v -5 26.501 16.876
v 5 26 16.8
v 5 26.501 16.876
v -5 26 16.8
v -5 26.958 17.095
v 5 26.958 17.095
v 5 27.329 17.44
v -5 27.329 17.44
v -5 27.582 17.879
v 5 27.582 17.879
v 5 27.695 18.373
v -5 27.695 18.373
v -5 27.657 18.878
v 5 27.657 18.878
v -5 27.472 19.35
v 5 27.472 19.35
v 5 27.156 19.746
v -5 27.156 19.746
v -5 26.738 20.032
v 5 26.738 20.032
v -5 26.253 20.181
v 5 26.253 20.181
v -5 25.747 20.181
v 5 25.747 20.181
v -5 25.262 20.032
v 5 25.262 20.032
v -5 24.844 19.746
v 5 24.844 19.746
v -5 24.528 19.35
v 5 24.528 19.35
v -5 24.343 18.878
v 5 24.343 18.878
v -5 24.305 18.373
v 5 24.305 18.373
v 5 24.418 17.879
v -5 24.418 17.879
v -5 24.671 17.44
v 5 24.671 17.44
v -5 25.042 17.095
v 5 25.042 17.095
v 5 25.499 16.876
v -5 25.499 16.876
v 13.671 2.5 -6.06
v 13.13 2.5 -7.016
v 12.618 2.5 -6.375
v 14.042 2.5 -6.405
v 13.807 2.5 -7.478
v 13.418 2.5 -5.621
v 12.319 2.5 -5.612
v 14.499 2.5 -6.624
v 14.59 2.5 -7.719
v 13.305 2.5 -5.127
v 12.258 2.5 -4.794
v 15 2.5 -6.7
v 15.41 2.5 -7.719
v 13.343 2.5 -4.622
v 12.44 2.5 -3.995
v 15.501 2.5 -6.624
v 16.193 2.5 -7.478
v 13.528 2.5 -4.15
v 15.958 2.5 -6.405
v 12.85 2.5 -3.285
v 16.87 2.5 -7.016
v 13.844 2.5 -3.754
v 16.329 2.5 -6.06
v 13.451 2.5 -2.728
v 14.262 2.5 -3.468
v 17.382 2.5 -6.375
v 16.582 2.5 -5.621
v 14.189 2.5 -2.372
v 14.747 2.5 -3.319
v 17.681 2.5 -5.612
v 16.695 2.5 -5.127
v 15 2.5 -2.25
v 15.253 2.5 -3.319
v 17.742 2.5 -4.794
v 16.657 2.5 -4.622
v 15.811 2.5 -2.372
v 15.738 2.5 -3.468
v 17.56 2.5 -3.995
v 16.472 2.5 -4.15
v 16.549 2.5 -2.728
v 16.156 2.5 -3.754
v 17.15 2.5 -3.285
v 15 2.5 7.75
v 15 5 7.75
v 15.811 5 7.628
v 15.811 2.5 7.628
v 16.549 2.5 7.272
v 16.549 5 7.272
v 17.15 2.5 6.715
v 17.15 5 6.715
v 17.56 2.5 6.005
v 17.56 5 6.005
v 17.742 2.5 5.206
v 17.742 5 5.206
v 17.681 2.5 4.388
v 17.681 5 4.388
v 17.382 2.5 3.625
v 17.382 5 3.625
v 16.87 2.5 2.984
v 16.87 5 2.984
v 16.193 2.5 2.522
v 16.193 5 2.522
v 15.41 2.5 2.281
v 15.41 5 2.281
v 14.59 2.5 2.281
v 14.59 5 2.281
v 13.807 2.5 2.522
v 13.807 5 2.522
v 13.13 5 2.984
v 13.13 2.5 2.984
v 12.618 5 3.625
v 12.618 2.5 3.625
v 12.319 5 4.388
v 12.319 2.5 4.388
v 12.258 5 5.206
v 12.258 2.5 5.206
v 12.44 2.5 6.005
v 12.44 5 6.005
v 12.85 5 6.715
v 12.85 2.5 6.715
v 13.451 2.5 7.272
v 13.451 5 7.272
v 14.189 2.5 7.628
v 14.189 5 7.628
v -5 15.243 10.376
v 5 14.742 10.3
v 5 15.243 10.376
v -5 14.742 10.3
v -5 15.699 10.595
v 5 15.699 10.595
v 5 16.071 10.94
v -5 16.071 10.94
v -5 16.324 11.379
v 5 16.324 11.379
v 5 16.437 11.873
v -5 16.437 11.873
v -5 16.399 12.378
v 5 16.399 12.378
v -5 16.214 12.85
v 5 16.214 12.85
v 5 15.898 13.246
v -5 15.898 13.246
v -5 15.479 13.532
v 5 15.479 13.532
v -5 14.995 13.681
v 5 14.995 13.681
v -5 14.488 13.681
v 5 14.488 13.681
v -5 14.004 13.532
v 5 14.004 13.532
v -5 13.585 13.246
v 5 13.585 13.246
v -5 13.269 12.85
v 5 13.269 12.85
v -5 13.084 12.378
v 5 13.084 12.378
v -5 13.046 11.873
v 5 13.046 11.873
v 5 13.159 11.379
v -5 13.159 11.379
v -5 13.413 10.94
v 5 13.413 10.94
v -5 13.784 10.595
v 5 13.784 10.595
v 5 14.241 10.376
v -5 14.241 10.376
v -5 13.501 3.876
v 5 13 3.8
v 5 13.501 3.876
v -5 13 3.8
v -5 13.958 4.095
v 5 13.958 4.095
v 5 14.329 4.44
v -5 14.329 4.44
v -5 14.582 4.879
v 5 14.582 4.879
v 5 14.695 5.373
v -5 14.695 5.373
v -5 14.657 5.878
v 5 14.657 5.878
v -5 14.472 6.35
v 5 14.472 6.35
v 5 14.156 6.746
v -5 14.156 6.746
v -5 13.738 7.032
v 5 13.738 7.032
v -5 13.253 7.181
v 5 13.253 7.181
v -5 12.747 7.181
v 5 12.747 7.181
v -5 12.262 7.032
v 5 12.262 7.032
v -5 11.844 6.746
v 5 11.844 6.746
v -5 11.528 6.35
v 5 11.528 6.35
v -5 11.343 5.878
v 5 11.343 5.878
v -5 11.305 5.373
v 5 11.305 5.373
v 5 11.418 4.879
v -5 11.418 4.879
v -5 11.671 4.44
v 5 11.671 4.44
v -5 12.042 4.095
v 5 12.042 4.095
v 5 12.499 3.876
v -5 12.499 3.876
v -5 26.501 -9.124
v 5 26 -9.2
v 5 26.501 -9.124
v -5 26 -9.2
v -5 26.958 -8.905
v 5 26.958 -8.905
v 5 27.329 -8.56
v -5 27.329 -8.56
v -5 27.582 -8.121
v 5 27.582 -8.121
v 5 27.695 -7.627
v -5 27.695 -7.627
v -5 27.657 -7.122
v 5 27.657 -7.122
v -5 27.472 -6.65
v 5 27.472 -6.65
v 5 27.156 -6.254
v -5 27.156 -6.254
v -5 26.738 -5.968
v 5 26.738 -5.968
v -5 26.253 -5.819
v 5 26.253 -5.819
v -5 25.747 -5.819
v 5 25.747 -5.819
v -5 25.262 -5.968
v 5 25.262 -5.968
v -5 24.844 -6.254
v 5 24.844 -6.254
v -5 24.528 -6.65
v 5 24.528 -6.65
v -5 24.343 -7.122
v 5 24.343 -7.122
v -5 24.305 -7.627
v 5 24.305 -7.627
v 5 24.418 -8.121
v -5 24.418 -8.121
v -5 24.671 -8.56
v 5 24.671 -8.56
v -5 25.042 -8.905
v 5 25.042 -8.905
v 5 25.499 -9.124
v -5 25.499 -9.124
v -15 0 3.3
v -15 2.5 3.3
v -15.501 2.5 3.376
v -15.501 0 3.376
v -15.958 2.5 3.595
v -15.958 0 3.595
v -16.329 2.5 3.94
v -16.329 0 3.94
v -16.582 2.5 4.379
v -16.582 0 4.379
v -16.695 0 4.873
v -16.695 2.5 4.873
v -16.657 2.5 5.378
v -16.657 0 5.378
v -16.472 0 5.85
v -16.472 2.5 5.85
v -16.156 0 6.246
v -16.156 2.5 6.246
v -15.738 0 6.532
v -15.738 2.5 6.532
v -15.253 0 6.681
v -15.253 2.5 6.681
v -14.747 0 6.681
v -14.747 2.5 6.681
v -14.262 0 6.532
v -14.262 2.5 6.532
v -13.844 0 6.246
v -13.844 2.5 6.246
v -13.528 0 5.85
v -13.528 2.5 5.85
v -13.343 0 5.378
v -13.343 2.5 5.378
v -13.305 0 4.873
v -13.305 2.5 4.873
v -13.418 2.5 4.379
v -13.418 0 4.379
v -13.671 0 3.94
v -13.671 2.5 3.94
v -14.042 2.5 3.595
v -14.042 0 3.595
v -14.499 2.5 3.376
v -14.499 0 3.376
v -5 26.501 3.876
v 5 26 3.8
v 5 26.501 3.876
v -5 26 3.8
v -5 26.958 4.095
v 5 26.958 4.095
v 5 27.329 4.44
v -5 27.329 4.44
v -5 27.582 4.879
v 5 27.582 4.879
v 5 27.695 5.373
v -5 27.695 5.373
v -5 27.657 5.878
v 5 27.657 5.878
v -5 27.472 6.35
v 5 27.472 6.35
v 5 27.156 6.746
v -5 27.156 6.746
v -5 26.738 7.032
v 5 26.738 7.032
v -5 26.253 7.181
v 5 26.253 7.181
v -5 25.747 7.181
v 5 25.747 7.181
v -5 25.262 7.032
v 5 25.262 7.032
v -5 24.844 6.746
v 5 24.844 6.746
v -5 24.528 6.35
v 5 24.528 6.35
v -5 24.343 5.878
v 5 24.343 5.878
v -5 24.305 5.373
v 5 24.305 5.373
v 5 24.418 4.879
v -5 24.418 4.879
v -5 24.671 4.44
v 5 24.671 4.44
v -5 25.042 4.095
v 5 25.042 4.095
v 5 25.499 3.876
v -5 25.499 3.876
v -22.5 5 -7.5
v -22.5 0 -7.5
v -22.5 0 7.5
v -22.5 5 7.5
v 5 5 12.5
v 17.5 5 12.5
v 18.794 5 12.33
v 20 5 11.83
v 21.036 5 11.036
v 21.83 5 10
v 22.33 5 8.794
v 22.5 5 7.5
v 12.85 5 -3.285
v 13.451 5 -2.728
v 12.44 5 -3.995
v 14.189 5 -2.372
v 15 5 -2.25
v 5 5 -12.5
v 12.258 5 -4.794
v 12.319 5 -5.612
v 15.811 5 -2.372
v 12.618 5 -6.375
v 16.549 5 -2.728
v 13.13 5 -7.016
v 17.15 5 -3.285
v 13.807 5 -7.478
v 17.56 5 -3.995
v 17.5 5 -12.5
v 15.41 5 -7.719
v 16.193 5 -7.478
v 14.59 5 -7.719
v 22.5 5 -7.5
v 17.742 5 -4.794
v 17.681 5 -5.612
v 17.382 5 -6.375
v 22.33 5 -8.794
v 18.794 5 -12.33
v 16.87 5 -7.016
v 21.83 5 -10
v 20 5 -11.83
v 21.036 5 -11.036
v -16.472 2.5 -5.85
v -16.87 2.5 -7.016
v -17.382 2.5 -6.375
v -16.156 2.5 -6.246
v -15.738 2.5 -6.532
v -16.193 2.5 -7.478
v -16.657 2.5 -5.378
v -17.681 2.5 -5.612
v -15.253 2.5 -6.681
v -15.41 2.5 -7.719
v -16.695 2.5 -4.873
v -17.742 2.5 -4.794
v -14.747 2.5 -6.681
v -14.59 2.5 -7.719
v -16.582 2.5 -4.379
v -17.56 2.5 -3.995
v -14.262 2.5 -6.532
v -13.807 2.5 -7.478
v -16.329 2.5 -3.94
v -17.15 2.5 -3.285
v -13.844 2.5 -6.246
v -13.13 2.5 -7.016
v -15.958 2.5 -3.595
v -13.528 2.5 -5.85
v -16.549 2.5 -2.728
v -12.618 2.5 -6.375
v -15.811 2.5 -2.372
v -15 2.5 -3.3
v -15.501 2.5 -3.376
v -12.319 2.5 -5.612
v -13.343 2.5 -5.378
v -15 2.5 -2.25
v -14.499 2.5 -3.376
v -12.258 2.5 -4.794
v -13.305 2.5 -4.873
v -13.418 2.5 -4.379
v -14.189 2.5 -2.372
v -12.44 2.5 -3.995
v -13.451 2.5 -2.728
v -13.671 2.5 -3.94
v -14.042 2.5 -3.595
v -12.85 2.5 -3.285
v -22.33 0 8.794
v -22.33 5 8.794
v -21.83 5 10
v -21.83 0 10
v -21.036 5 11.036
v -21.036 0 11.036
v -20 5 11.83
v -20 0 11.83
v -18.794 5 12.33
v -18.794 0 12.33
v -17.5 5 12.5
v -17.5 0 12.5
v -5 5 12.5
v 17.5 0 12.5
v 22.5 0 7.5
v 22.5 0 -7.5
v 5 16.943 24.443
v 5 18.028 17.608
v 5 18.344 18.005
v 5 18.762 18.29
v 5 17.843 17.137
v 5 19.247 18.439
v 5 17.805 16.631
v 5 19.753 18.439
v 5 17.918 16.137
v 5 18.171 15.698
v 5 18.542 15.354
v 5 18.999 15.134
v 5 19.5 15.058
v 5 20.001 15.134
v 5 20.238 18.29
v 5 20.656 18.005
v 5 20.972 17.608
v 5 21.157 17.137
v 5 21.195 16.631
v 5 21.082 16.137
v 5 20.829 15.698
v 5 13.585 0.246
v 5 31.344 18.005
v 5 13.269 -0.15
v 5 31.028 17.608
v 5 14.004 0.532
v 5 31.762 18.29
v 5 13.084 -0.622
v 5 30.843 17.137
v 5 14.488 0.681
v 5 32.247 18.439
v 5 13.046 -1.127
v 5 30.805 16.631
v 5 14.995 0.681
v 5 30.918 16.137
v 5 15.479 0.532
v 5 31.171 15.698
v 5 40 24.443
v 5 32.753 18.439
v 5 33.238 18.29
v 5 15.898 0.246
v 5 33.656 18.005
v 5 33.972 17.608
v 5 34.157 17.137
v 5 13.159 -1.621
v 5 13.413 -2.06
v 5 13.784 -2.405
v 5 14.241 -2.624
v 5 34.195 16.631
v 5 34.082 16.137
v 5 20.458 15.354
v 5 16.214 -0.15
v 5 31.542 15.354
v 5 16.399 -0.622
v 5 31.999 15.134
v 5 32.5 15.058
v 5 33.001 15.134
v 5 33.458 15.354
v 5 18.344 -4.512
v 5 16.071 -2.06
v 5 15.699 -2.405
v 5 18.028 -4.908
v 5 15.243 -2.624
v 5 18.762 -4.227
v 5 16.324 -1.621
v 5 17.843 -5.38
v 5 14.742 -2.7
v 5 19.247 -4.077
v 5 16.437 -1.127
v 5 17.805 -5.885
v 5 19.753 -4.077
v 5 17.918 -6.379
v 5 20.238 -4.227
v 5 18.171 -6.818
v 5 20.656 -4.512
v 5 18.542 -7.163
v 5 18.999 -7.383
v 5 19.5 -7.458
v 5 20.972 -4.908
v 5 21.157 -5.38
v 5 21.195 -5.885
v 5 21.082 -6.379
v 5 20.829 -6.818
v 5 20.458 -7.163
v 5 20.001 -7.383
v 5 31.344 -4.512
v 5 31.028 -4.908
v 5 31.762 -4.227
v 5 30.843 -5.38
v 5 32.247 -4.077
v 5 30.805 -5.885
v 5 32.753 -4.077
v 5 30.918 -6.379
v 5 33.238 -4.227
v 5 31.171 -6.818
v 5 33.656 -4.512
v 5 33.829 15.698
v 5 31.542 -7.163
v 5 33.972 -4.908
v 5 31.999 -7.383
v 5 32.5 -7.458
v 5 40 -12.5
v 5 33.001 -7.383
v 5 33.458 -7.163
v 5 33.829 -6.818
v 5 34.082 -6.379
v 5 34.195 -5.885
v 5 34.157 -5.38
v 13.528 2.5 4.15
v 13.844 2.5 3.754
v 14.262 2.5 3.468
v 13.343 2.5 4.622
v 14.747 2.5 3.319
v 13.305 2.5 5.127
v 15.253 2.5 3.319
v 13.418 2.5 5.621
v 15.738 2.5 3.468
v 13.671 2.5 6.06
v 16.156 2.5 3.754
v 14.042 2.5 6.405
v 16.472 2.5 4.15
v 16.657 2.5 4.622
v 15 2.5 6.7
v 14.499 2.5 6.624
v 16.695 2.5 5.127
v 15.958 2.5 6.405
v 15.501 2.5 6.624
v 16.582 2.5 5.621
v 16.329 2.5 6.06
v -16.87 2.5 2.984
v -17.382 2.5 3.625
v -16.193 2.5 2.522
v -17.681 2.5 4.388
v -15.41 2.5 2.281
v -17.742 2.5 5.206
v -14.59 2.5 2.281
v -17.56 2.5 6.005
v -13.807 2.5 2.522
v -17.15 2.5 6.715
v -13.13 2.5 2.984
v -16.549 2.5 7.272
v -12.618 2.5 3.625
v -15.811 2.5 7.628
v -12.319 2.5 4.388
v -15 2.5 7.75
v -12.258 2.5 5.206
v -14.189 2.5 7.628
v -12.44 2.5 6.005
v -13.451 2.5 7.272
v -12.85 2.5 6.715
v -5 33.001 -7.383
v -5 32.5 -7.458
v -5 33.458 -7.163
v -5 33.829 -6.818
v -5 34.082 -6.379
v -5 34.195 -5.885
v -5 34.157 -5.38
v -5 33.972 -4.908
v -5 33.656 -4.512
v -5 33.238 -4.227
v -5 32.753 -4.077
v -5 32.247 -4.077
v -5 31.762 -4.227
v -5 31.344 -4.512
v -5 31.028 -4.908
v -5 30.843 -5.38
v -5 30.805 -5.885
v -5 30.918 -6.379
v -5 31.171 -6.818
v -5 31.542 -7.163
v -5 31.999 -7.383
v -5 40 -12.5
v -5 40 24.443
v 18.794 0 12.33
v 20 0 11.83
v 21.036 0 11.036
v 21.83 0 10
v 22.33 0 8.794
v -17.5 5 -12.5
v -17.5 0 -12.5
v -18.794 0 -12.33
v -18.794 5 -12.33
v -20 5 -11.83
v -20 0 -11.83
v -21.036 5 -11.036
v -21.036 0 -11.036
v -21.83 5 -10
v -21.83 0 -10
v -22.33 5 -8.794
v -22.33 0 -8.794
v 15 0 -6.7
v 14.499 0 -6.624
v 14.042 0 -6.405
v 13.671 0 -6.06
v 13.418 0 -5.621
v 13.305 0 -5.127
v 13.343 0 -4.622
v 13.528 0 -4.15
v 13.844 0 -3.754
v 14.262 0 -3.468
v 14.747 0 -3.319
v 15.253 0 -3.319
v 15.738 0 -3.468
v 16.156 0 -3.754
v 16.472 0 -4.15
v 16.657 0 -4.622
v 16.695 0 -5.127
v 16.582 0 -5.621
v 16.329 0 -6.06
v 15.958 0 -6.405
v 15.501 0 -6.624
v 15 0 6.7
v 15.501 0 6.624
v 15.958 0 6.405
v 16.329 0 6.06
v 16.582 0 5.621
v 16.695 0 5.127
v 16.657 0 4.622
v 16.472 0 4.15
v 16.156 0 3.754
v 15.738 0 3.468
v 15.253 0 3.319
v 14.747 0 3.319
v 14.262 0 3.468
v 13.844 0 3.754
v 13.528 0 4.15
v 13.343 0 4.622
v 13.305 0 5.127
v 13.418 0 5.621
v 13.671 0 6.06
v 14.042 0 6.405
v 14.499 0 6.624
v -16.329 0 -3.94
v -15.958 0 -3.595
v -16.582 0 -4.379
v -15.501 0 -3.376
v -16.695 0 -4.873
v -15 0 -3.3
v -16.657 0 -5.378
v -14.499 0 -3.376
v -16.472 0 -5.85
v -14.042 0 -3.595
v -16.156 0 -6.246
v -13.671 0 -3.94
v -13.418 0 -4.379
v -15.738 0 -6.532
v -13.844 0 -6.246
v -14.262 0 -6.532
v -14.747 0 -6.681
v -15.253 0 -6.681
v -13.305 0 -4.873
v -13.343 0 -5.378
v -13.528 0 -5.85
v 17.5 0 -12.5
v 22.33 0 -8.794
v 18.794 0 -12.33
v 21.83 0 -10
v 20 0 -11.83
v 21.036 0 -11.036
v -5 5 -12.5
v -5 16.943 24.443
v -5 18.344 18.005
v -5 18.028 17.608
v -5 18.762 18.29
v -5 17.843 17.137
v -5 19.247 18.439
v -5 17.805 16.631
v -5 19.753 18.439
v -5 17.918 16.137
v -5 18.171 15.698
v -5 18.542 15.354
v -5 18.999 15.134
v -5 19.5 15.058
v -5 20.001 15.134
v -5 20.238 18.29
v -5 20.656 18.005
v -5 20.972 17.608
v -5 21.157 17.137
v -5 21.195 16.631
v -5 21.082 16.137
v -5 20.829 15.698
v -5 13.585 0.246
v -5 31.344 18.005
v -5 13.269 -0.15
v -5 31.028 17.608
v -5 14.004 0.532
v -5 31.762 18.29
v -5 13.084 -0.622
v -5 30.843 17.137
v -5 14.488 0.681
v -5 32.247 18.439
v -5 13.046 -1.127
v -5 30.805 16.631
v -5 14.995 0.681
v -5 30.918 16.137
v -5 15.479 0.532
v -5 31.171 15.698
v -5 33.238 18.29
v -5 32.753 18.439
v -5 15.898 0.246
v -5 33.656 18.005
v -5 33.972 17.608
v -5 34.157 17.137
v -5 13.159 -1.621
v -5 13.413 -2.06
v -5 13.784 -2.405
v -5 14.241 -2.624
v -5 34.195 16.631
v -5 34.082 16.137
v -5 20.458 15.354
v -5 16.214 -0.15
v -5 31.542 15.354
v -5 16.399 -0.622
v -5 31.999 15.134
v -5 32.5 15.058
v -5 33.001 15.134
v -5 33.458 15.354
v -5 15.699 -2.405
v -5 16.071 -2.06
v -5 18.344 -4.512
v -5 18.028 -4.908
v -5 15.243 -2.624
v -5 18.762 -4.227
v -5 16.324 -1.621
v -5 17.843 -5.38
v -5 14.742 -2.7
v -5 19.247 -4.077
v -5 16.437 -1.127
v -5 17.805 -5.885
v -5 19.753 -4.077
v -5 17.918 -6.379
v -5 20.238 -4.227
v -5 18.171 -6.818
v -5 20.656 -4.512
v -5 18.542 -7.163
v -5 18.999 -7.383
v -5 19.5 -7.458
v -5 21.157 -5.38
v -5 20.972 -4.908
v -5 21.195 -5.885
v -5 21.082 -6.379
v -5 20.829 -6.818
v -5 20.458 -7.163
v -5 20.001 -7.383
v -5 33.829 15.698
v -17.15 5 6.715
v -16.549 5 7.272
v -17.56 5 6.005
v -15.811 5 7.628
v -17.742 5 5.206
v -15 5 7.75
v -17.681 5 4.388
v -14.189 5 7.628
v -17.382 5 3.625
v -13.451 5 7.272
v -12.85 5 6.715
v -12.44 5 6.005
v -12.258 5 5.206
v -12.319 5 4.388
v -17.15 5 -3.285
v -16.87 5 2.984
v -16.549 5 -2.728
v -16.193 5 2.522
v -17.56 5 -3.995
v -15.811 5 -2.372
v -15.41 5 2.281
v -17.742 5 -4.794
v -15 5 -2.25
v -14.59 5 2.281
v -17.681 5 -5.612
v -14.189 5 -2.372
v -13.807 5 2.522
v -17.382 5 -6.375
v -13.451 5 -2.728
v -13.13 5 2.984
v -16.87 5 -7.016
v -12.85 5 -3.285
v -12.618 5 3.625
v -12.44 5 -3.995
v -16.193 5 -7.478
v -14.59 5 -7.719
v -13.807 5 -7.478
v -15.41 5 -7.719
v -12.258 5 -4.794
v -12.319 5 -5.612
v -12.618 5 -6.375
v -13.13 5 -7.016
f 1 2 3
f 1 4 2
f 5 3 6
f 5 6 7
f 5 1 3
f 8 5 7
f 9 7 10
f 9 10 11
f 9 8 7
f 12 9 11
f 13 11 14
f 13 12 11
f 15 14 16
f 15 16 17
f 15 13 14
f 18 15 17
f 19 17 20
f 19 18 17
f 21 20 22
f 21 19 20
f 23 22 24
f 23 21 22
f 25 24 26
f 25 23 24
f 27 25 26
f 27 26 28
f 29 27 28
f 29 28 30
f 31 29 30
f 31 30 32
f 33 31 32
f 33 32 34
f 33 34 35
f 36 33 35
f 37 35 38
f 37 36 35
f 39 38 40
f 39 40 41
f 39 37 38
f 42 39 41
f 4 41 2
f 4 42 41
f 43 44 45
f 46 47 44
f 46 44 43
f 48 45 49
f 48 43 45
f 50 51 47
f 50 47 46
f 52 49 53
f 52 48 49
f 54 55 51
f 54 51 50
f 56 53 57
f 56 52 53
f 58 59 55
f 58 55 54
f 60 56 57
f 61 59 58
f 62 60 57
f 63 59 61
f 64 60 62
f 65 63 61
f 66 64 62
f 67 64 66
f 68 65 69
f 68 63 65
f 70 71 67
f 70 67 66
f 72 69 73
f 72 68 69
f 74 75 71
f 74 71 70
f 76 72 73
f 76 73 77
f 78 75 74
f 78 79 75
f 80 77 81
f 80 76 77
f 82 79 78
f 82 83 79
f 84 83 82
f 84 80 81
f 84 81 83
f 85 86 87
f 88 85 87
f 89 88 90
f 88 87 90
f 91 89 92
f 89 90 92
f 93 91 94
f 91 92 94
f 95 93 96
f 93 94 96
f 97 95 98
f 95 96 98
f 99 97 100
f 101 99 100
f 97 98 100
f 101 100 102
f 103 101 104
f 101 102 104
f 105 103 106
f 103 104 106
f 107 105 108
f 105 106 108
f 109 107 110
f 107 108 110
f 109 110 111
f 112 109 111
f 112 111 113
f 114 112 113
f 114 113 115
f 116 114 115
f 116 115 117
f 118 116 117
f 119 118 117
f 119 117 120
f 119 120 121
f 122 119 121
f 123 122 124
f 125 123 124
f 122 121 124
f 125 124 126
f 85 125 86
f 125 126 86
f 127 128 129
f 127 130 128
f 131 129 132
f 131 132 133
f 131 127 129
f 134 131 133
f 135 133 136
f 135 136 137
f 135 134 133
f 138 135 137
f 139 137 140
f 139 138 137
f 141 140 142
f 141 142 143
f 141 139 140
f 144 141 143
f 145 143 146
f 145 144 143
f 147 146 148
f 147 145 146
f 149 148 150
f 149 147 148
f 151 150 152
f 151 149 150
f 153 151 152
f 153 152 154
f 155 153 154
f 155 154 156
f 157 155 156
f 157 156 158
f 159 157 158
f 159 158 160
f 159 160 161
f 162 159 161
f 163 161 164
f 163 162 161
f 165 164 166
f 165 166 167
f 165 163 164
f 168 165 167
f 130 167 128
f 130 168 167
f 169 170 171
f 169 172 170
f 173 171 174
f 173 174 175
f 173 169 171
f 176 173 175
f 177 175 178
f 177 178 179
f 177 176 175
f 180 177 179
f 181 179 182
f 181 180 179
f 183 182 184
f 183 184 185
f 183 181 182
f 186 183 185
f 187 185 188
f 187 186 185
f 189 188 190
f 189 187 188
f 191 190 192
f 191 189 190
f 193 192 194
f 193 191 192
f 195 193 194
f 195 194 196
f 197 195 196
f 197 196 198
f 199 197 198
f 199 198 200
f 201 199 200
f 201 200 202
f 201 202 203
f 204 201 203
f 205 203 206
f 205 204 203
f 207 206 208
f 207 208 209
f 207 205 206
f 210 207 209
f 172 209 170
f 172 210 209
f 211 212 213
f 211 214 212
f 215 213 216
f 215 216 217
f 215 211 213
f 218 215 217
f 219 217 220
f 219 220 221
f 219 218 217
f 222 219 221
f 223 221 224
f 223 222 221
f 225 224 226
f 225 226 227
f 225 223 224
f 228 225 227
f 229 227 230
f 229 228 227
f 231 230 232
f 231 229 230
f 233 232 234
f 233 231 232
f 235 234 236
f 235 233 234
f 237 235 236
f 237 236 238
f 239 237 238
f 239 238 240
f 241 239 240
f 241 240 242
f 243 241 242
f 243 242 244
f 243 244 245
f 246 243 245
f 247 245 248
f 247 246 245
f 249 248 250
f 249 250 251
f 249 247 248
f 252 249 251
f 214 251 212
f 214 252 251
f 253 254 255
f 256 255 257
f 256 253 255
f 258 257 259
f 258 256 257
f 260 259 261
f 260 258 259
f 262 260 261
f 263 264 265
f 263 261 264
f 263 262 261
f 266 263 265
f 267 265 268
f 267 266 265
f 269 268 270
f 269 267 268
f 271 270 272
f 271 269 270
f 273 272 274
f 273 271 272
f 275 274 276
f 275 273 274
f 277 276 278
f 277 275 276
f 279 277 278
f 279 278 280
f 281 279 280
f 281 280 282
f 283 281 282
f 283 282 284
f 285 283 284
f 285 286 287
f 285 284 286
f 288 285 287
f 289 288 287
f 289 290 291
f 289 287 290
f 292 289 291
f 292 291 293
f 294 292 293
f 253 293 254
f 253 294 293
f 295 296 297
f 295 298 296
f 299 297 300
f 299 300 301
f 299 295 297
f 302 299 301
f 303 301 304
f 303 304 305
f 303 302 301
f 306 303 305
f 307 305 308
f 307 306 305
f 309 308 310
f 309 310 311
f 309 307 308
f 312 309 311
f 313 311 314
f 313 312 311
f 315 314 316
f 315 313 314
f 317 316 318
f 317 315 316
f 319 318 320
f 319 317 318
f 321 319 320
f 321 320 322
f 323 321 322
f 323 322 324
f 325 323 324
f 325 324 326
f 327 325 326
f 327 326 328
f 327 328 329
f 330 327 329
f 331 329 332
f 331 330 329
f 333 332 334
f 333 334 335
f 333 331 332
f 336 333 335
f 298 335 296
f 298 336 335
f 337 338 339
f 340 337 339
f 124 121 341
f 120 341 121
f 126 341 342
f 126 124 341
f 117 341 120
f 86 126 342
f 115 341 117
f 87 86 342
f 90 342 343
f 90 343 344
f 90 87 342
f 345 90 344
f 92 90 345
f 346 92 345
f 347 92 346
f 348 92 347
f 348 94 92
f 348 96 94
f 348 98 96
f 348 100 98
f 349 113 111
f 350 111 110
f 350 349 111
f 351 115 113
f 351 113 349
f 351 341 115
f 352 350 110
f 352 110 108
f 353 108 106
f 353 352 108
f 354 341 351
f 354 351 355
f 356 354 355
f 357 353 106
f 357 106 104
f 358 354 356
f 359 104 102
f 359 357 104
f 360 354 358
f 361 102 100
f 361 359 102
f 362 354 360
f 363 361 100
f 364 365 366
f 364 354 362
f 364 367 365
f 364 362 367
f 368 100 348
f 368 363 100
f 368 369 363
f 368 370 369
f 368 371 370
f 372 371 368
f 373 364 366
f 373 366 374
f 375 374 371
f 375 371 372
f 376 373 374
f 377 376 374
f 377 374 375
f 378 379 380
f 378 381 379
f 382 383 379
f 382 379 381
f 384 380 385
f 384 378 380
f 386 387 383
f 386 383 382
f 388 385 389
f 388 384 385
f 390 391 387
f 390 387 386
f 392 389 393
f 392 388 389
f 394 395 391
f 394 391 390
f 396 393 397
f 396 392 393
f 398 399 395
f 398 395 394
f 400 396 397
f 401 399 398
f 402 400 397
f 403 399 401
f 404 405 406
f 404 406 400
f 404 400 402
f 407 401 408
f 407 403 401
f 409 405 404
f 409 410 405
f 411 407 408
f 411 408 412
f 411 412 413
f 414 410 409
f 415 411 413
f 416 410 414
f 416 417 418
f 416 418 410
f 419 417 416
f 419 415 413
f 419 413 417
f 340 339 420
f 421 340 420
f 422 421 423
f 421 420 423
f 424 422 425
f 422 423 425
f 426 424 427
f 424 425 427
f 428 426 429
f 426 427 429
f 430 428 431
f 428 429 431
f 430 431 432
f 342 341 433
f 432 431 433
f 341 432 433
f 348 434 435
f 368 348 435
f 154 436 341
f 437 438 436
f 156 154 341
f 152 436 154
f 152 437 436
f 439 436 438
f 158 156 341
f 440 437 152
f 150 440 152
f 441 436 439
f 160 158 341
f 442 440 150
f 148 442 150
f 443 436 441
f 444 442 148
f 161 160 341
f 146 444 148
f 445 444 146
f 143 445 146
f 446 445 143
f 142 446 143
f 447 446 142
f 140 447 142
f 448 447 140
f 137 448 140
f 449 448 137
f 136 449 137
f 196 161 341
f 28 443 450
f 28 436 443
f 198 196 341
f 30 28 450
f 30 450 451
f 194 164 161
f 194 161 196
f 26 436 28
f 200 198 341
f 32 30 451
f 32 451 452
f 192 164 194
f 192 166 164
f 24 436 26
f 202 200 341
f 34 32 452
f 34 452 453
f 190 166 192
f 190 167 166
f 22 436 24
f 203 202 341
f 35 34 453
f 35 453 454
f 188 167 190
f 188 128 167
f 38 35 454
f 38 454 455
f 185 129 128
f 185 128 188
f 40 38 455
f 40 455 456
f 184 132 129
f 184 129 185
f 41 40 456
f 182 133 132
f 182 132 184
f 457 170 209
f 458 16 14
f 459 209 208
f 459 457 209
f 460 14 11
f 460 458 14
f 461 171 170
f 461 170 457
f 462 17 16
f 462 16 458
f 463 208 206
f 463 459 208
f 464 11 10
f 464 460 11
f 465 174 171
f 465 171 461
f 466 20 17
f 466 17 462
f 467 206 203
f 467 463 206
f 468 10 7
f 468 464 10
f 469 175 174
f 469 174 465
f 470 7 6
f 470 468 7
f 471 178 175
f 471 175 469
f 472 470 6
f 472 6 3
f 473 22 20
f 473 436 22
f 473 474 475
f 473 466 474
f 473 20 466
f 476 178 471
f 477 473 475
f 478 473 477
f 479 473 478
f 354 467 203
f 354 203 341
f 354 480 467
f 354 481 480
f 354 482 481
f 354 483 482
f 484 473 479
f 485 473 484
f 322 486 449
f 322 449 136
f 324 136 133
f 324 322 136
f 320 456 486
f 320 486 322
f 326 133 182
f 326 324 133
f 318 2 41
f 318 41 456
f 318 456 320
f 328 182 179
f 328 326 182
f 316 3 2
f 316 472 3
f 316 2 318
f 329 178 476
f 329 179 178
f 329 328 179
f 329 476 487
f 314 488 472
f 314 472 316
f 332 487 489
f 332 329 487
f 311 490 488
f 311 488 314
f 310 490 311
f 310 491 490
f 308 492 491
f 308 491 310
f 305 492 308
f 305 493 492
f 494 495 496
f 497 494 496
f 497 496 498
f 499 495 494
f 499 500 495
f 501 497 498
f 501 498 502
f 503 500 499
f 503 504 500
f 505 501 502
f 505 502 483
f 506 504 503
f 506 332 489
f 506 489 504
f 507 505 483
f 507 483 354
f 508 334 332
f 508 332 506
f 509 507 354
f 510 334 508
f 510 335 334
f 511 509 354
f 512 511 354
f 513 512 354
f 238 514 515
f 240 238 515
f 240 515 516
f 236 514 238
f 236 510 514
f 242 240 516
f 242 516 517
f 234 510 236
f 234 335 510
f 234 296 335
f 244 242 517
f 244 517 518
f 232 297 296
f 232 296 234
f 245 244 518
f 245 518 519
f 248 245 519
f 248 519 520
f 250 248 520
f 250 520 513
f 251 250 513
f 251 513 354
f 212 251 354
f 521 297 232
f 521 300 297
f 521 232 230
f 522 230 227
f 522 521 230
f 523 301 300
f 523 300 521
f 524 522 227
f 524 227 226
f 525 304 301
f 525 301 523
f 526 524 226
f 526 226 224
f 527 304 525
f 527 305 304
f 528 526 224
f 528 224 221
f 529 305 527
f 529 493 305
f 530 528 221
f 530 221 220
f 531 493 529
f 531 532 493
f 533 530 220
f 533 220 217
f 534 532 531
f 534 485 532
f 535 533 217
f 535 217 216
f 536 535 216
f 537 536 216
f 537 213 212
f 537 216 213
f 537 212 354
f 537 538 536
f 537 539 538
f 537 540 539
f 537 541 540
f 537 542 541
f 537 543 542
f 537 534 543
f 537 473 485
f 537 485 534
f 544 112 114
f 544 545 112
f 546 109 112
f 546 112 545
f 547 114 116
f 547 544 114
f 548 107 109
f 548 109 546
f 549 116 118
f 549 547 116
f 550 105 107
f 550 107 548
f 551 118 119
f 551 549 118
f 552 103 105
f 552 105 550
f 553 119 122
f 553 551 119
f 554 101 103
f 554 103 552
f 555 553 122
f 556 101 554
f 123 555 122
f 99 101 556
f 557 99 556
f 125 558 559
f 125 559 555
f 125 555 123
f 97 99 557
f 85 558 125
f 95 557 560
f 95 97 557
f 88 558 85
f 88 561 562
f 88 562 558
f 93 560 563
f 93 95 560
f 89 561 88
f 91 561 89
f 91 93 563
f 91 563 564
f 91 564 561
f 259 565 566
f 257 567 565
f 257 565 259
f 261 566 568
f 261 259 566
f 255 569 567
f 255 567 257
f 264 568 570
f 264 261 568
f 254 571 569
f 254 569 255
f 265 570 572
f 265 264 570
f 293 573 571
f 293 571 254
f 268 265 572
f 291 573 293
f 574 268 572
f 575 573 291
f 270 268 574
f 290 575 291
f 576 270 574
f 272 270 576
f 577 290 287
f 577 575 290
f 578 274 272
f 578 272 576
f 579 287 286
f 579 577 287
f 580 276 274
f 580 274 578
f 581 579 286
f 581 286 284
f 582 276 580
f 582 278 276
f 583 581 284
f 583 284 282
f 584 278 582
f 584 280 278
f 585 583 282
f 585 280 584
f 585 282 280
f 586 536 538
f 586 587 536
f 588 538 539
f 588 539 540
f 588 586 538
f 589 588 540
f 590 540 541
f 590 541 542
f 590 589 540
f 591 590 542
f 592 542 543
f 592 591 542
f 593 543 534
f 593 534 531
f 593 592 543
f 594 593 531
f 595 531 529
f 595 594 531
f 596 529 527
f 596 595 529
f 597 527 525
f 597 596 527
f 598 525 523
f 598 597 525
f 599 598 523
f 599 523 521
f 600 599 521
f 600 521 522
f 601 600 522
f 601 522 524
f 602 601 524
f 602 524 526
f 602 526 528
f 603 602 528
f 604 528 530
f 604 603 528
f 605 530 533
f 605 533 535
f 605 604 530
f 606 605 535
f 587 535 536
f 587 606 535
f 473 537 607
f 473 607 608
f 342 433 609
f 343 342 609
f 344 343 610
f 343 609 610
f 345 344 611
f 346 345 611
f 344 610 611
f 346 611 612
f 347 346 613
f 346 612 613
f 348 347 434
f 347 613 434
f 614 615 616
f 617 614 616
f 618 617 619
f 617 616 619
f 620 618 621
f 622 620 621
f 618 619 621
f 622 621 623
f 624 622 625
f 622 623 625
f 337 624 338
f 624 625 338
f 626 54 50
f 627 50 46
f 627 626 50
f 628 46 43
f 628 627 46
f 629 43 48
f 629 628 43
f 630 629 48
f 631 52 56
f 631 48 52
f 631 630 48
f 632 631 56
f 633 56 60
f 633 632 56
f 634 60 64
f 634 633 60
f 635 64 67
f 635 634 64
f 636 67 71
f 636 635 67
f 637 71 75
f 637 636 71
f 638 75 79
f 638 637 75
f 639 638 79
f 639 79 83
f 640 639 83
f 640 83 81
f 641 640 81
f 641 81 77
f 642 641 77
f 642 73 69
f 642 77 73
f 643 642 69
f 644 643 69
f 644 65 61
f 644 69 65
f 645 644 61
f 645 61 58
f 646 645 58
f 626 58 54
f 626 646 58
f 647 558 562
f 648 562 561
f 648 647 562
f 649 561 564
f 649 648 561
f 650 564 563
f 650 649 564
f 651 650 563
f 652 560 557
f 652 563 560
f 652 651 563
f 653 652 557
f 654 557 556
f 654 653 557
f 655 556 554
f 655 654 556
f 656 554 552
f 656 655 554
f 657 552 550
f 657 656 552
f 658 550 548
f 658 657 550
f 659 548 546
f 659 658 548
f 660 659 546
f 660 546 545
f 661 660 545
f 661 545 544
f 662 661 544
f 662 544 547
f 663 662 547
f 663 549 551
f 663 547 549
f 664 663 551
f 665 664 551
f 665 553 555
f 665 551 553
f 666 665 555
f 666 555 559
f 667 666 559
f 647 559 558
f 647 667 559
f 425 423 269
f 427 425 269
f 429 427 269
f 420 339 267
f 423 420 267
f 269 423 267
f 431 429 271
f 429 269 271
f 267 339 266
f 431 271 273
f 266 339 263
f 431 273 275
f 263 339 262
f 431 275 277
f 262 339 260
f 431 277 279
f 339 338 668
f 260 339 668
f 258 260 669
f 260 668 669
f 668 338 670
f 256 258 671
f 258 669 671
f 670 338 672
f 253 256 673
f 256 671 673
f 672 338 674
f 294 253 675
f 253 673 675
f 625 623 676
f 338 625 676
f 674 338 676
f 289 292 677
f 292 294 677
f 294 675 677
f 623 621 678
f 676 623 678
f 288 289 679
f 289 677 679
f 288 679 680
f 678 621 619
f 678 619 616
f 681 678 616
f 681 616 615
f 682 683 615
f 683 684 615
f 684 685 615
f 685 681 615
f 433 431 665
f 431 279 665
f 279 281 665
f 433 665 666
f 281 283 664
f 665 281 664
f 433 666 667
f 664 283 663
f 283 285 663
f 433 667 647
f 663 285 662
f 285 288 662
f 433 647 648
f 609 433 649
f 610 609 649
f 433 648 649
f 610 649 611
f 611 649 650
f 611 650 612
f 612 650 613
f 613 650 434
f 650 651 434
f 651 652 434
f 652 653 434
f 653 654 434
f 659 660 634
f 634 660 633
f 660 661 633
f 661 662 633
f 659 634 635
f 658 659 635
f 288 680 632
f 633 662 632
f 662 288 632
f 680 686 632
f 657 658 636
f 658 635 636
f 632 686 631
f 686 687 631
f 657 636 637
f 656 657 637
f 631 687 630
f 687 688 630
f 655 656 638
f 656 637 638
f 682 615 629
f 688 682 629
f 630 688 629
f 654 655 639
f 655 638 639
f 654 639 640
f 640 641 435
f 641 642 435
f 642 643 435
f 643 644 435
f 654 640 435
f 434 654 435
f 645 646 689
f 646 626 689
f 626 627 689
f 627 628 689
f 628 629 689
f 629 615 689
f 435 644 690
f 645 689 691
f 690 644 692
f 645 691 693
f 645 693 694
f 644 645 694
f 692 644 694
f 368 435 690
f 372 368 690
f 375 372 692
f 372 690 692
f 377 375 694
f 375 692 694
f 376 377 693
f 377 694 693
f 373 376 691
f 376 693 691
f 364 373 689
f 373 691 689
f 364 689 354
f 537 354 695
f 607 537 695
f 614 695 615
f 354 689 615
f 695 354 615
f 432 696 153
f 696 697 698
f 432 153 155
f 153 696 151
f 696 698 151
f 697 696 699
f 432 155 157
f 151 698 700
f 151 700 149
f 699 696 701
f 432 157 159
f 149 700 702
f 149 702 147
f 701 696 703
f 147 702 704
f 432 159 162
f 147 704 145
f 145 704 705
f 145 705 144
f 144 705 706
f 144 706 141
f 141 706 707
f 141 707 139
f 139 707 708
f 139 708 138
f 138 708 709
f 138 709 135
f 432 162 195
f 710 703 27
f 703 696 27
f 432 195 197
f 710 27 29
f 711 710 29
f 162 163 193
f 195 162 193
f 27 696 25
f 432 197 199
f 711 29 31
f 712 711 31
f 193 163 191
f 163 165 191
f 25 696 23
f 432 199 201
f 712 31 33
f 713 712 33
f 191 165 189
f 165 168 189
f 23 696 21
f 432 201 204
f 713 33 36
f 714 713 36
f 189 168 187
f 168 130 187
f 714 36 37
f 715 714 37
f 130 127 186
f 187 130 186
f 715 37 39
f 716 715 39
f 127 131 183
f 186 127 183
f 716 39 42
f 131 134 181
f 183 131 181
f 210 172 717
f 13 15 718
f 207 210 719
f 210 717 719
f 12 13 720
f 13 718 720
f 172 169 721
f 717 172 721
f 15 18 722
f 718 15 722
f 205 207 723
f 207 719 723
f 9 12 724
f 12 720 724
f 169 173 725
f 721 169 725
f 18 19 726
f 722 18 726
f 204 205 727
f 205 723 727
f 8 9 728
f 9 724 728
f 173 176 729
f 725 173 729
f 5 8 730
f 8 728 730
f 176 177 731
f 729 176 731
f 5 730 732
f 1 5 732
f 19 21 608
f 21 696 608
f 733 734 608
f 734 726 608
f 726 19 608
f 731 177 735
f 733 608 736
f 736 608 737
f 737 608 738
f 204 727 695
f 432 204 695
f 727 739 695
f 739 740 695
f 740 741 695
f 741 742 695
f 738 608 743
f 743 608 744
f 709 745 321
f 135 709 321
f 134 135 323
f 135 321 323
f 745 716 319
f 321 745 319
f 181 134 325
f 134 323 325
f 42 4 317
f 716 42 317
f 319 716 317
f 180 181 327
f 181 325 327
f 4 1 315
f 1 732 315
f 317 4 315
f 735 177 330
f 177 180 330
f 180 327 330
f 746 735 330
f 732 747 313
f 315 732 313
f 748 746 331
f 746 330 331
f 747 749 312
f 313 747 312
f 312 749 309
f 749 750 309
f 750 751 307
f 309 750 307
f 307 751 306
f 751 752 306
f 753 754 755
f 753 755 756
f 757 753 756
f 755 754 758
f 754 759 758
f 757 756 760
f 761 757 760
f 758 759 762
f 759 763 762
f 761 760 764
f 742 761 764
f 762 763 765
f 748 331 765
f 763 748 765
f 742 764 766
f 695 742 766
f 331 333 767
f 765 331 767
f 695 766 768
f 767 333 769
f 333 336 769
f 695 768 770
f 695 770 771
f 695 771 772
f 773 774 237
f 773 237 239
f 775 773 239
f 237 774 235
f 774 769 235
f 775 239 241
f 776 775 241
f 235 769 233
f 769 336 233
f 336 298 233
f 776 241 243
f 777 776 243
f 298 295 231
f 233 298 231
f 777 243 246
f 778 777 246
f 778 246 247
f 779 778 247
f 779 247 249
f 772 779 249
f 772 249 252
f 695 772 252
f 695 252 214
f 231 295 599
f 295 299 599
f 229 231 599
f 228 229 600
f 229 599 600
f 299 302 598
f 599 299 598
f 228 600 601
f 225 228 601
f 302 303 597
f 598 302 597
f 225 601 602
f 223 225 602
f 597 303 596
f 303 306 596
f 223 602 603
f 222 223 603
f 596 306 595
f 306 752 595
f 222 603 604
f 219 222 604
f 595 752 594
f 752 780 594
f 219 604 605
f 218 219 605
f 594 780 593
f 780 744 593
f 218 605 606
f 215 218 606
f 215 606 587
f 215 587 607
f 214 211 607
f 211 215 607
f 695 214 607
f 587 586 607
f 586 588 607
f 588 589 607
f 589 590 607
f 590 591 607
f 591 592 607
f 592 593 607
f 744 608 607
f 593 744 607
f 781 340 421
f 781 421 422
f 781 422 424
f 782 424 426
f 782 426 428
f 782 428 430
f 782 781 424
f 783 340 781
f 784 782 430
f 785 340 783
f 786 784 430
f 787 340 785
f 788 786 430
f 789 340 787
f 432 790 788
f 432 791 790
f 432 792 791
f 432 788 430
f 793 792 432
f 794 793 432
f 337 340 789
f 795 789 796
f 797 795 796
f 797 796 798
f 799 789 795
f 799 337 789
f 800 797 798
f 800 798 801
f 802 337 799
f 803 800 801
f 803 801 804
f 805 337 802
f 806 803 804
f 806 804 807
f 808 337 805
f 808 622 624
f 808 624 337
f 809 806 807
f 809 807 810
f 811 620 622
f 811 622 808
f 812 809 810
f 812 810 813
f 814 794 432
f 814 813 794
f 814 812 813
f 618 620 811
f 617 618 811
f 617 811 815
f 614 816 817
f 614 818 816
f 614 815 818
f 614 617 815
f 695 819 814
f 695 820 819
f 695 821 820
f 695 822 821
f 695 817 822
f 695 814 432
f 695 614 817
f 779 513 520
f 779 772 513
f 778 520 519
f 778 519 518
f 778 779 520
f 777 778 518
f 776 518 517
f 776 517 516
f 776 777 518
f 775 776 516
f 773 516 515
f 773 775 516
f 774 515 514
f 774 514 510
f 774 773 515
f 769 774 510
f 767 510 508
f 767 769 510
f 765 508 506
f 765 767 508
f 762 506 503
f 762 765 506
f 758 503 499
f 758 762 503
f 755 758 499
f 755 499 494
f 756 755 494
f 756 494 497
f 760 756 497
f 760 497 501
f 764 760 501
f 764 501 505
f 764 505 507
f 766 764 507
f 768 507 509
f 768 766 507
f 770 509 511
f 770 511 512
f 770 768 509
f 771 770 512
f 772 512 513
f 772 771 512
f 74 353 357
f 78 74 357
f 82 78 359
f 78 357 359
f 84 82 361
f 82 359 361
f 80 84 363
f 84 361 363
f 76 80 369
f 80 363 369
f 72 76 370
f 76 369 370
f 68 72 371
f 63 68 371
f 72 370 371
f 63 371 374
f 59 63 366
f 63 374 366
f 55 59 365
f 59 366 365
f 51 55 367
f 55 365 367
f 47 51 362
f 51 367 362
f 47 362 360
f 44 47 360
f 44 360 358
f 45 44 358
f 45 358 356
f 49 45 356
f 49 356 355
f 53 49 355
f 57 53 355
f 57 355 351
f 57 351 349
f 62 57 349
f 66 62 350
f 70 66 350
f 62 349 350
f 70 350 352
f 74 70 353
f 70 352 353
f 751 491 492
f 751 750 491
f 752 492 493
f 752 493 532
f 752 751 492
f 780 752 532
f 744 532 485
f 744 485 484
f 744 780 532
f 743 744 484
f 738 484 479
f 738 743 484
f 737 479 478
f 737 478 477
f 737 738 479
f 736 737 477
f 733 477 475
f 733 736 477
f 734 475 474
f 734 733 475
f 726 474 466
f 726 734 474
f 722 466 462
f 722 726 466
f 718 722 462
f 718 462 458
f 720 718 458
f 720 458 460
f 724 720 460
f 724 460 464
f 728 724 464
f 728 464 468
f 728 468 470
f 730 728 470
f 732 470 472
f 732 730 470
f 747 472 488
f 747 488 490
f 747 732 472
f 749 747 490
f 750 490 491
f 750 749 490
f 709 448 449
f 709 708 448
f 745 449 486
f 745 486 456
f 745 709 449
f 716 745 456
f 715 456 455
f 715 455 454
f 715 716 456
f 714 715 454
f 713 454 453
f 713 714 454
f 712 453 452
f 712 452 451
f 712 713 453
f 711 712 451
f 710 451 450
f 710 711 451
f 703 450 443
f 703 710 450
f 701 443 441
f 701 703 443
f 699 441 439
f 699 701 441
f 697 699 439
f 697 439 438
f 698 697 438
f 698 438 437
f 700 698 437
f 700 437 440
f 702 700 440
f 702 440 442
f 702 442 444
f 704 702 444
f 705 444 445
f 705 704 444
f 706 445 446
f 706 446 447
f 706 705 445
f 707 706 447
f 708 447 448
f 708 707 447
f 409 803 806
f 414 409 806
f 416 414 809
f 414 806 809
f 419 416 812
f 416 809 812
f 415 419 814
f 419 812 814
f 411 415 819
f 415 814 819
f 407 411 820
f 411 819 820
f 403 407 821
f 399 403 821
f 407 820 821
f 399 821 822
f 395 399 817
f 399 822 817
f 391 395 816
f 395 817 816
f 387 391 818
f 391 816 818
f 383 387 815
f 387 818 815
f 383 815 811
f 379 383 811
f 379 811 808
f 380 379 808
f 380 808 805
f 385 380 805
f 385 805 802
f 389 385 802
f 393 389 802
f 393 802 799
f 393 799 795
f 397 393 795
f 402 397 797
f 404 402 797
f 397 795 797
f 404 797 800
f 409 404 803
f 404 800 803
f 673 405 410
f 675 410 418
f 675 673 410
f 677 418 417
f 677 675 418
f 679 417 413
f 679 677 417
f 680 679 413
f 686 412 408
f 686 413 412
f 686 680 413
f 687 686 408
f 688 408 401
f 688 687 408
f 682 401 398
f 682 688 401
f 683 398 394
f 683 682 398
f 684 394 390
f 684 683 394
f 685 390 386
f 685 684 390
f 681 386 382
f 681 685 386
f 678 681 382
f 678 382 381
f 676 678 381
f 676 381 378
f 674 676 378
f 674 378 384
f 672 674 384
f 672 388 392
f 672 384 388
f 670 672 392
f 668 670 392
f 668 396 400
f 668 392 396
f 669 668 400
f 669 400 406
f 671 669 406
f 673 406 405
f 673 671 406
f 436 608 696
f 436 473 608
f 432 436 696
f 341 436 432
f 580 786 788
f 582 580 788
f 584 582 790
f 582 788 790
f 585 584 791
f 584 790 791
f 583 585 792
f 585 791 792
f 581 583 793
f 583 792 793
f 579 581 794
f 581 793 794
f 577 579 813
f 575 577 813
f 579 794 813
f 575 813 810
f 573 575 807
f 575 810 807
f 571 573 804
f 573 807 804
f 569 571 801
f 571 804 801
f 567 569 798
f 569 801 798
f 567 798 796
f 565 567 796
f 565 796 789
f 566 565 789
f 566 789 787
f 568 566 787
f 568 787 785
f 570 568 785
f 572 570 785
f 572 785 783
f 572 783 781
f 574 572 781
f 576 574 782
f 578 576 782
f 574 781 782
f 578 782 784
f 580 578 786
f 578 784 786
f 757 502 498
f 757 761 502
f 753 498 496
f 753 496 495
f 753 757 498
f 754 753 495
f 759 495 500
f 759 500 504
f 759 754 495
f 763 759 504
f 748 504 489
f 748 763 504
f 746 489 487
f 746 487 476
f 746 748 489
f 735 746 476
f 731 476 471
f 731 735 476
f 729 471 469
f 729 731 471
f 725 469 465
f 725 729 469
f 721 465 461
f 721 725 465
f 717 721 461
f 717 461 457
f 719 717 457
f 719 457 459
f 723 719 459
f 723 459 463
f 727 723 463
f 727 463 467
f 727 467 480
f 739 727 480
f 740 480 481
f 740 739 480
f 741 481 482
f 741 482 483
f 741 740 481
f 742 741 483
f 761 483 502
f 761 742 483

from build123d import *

# Parameters (mm, degrees)
SKETCH3_R           = 1.7
BOSS_EXTRUDE2_DEPTH = 5
SKETCH8_R           = 1.7
BOSS_EXTRUDE4_DEPTH = 5
SKETCH10_R          = 2.75
CUT_EXTRUDE1_DEPTH  = 2.5


with BuildPart() as part:
    # Sketch3 → Boss-Extrude2 (new body)
    with BuildSketch(Plane(origin=(0, 0, 0), x_dir=(1, 0, 0), z_dir=(0, 1, 0))):
        with BuildLine():
            Line((-17.5, -12.5), (17.5, -12.5))
            ThreePointArc((17.5, -12.5), (21.035533906, -11.035533906), (22.5, -7.5))
            Line((22.5, -7.5), (22.5, 7.5))
            ThreePointArc((22.5, 7.5), (21.035533906, 11.035533906), (17.5, 12.5))
            Line((17.5, 12.5), (-17.5, 12.5))
            ThreePointArc((-17.5, 12.5), (-21.035533906, 11.035533906), (-22.5, 7.5))
            Line((-22.5, 7.5), (-22.5, -7.5))
            ThreePointArc((-22.5, -7.5), (-21.035533906, -11.035533906), (-17.5, -12.5))
        make_face()
        with Locations(Location((-15, 5, 0), (0, 0, 270))):
            Circle(SKETCH3_R, mode=Mode.SUBTRACT)
        with Locations(Location((15, 5, 0), (0, 0, 90))):
            Circle(SKETCH3_R, mode=Mode.SUBTRACT)
        with Locations(Location((15, -5, 0), (0, 0, 270))):
            Circle(SKETCH3_R, mode=Mode.SUBTRACT)
        with Locations(Location((-15, -5, 0), (0, 0, 90))):
            Circle(SKETCH3_R, mode=Mode.SUBTRACT)
    extrude(amount=BOSS_EXTRUDE2_DEPTH)

    # Sketch8 → Boss-Extrude4 (add, symmetric)
    with BuildSketch(Plane(origin=(0, 0, 0), x_dir=(0, 0, -1), z_dir=(1, 0, 0))):
        Polygon((-12.5, 5), (12.5, 5), (12.5, 40), (-24.442906699, 40), (-24.442906699, 16.942906699), align=None)
        with Locations((-16.758330249, 19.5)):
            Circle(SKETCH8_R, mode=Mode.SUBTRACT)
        with Locations((-12, 14.741669751)):
            Circle(SKETCH8_R, mode=Mode.SUBTRACT)
        with Locations((-5.5, 13)):
            Circle(SKETCH8_R, mode=Mode.SUBTRACT)
        with Locations((1, 14.741669751)):
            Circle(SKETCH8_R, mode=Mode.SUBTRACT)
        with Locations((5.758330249, 19.5)):
            Circle(SKETCH8_R, mode=Mode.SUBTRACT)
        with Locations((-18.5, 26)):
            Circle(SKETCH8_R, mode=Mode.SUBTRACT)
        with Locations((-16.758330249, 32.5)):
            Circle(SKETCH8_R, mode=Mode.SUBTRACT)
        with Locations((-5.5, 26)):
            Circle(SKETCH8_R, mode=Mode.SUBTRACT)
        with Locations((7.5, 26)):
            Circle(SKETCH8_R, mode=Mode.SUBTRACT)
        with Locations((5.758330249, 32.5)):
            Circle(SKETCH8_R, mode=Mode.SUBTRACT)
    extrude(amount=BOSS_EXTRUDE4_DEPTH, both=True)

    # Sketch10 → Cut-Extrude1 (cut)
    with BuildSketch(Plane(origin=(0, 5, 0), x_dir=(1, 0, 0), z_dir=(0, 1, 0))):
        with Locations(Location((15, -5, 0), (0, 0, 270))):
            Circle(SKETCH10_R)
        with Locations(Location((-15, -5, 0), (0, 0, 270))):
            Circle(SKETCH10_R)
        with Locations(Location((-15, 5, 0), (0, 0, 270))):
            Circle(SKETCH10_R)
        with Locations(Location((15, 5, 0), (0, 0, 270))):
            Circle(SKETCH10_R)
    extrude(amount=-CUT_EXTRUDE1_DEPTH, mode=Mode.SUBTRACT)


solid = part.part
